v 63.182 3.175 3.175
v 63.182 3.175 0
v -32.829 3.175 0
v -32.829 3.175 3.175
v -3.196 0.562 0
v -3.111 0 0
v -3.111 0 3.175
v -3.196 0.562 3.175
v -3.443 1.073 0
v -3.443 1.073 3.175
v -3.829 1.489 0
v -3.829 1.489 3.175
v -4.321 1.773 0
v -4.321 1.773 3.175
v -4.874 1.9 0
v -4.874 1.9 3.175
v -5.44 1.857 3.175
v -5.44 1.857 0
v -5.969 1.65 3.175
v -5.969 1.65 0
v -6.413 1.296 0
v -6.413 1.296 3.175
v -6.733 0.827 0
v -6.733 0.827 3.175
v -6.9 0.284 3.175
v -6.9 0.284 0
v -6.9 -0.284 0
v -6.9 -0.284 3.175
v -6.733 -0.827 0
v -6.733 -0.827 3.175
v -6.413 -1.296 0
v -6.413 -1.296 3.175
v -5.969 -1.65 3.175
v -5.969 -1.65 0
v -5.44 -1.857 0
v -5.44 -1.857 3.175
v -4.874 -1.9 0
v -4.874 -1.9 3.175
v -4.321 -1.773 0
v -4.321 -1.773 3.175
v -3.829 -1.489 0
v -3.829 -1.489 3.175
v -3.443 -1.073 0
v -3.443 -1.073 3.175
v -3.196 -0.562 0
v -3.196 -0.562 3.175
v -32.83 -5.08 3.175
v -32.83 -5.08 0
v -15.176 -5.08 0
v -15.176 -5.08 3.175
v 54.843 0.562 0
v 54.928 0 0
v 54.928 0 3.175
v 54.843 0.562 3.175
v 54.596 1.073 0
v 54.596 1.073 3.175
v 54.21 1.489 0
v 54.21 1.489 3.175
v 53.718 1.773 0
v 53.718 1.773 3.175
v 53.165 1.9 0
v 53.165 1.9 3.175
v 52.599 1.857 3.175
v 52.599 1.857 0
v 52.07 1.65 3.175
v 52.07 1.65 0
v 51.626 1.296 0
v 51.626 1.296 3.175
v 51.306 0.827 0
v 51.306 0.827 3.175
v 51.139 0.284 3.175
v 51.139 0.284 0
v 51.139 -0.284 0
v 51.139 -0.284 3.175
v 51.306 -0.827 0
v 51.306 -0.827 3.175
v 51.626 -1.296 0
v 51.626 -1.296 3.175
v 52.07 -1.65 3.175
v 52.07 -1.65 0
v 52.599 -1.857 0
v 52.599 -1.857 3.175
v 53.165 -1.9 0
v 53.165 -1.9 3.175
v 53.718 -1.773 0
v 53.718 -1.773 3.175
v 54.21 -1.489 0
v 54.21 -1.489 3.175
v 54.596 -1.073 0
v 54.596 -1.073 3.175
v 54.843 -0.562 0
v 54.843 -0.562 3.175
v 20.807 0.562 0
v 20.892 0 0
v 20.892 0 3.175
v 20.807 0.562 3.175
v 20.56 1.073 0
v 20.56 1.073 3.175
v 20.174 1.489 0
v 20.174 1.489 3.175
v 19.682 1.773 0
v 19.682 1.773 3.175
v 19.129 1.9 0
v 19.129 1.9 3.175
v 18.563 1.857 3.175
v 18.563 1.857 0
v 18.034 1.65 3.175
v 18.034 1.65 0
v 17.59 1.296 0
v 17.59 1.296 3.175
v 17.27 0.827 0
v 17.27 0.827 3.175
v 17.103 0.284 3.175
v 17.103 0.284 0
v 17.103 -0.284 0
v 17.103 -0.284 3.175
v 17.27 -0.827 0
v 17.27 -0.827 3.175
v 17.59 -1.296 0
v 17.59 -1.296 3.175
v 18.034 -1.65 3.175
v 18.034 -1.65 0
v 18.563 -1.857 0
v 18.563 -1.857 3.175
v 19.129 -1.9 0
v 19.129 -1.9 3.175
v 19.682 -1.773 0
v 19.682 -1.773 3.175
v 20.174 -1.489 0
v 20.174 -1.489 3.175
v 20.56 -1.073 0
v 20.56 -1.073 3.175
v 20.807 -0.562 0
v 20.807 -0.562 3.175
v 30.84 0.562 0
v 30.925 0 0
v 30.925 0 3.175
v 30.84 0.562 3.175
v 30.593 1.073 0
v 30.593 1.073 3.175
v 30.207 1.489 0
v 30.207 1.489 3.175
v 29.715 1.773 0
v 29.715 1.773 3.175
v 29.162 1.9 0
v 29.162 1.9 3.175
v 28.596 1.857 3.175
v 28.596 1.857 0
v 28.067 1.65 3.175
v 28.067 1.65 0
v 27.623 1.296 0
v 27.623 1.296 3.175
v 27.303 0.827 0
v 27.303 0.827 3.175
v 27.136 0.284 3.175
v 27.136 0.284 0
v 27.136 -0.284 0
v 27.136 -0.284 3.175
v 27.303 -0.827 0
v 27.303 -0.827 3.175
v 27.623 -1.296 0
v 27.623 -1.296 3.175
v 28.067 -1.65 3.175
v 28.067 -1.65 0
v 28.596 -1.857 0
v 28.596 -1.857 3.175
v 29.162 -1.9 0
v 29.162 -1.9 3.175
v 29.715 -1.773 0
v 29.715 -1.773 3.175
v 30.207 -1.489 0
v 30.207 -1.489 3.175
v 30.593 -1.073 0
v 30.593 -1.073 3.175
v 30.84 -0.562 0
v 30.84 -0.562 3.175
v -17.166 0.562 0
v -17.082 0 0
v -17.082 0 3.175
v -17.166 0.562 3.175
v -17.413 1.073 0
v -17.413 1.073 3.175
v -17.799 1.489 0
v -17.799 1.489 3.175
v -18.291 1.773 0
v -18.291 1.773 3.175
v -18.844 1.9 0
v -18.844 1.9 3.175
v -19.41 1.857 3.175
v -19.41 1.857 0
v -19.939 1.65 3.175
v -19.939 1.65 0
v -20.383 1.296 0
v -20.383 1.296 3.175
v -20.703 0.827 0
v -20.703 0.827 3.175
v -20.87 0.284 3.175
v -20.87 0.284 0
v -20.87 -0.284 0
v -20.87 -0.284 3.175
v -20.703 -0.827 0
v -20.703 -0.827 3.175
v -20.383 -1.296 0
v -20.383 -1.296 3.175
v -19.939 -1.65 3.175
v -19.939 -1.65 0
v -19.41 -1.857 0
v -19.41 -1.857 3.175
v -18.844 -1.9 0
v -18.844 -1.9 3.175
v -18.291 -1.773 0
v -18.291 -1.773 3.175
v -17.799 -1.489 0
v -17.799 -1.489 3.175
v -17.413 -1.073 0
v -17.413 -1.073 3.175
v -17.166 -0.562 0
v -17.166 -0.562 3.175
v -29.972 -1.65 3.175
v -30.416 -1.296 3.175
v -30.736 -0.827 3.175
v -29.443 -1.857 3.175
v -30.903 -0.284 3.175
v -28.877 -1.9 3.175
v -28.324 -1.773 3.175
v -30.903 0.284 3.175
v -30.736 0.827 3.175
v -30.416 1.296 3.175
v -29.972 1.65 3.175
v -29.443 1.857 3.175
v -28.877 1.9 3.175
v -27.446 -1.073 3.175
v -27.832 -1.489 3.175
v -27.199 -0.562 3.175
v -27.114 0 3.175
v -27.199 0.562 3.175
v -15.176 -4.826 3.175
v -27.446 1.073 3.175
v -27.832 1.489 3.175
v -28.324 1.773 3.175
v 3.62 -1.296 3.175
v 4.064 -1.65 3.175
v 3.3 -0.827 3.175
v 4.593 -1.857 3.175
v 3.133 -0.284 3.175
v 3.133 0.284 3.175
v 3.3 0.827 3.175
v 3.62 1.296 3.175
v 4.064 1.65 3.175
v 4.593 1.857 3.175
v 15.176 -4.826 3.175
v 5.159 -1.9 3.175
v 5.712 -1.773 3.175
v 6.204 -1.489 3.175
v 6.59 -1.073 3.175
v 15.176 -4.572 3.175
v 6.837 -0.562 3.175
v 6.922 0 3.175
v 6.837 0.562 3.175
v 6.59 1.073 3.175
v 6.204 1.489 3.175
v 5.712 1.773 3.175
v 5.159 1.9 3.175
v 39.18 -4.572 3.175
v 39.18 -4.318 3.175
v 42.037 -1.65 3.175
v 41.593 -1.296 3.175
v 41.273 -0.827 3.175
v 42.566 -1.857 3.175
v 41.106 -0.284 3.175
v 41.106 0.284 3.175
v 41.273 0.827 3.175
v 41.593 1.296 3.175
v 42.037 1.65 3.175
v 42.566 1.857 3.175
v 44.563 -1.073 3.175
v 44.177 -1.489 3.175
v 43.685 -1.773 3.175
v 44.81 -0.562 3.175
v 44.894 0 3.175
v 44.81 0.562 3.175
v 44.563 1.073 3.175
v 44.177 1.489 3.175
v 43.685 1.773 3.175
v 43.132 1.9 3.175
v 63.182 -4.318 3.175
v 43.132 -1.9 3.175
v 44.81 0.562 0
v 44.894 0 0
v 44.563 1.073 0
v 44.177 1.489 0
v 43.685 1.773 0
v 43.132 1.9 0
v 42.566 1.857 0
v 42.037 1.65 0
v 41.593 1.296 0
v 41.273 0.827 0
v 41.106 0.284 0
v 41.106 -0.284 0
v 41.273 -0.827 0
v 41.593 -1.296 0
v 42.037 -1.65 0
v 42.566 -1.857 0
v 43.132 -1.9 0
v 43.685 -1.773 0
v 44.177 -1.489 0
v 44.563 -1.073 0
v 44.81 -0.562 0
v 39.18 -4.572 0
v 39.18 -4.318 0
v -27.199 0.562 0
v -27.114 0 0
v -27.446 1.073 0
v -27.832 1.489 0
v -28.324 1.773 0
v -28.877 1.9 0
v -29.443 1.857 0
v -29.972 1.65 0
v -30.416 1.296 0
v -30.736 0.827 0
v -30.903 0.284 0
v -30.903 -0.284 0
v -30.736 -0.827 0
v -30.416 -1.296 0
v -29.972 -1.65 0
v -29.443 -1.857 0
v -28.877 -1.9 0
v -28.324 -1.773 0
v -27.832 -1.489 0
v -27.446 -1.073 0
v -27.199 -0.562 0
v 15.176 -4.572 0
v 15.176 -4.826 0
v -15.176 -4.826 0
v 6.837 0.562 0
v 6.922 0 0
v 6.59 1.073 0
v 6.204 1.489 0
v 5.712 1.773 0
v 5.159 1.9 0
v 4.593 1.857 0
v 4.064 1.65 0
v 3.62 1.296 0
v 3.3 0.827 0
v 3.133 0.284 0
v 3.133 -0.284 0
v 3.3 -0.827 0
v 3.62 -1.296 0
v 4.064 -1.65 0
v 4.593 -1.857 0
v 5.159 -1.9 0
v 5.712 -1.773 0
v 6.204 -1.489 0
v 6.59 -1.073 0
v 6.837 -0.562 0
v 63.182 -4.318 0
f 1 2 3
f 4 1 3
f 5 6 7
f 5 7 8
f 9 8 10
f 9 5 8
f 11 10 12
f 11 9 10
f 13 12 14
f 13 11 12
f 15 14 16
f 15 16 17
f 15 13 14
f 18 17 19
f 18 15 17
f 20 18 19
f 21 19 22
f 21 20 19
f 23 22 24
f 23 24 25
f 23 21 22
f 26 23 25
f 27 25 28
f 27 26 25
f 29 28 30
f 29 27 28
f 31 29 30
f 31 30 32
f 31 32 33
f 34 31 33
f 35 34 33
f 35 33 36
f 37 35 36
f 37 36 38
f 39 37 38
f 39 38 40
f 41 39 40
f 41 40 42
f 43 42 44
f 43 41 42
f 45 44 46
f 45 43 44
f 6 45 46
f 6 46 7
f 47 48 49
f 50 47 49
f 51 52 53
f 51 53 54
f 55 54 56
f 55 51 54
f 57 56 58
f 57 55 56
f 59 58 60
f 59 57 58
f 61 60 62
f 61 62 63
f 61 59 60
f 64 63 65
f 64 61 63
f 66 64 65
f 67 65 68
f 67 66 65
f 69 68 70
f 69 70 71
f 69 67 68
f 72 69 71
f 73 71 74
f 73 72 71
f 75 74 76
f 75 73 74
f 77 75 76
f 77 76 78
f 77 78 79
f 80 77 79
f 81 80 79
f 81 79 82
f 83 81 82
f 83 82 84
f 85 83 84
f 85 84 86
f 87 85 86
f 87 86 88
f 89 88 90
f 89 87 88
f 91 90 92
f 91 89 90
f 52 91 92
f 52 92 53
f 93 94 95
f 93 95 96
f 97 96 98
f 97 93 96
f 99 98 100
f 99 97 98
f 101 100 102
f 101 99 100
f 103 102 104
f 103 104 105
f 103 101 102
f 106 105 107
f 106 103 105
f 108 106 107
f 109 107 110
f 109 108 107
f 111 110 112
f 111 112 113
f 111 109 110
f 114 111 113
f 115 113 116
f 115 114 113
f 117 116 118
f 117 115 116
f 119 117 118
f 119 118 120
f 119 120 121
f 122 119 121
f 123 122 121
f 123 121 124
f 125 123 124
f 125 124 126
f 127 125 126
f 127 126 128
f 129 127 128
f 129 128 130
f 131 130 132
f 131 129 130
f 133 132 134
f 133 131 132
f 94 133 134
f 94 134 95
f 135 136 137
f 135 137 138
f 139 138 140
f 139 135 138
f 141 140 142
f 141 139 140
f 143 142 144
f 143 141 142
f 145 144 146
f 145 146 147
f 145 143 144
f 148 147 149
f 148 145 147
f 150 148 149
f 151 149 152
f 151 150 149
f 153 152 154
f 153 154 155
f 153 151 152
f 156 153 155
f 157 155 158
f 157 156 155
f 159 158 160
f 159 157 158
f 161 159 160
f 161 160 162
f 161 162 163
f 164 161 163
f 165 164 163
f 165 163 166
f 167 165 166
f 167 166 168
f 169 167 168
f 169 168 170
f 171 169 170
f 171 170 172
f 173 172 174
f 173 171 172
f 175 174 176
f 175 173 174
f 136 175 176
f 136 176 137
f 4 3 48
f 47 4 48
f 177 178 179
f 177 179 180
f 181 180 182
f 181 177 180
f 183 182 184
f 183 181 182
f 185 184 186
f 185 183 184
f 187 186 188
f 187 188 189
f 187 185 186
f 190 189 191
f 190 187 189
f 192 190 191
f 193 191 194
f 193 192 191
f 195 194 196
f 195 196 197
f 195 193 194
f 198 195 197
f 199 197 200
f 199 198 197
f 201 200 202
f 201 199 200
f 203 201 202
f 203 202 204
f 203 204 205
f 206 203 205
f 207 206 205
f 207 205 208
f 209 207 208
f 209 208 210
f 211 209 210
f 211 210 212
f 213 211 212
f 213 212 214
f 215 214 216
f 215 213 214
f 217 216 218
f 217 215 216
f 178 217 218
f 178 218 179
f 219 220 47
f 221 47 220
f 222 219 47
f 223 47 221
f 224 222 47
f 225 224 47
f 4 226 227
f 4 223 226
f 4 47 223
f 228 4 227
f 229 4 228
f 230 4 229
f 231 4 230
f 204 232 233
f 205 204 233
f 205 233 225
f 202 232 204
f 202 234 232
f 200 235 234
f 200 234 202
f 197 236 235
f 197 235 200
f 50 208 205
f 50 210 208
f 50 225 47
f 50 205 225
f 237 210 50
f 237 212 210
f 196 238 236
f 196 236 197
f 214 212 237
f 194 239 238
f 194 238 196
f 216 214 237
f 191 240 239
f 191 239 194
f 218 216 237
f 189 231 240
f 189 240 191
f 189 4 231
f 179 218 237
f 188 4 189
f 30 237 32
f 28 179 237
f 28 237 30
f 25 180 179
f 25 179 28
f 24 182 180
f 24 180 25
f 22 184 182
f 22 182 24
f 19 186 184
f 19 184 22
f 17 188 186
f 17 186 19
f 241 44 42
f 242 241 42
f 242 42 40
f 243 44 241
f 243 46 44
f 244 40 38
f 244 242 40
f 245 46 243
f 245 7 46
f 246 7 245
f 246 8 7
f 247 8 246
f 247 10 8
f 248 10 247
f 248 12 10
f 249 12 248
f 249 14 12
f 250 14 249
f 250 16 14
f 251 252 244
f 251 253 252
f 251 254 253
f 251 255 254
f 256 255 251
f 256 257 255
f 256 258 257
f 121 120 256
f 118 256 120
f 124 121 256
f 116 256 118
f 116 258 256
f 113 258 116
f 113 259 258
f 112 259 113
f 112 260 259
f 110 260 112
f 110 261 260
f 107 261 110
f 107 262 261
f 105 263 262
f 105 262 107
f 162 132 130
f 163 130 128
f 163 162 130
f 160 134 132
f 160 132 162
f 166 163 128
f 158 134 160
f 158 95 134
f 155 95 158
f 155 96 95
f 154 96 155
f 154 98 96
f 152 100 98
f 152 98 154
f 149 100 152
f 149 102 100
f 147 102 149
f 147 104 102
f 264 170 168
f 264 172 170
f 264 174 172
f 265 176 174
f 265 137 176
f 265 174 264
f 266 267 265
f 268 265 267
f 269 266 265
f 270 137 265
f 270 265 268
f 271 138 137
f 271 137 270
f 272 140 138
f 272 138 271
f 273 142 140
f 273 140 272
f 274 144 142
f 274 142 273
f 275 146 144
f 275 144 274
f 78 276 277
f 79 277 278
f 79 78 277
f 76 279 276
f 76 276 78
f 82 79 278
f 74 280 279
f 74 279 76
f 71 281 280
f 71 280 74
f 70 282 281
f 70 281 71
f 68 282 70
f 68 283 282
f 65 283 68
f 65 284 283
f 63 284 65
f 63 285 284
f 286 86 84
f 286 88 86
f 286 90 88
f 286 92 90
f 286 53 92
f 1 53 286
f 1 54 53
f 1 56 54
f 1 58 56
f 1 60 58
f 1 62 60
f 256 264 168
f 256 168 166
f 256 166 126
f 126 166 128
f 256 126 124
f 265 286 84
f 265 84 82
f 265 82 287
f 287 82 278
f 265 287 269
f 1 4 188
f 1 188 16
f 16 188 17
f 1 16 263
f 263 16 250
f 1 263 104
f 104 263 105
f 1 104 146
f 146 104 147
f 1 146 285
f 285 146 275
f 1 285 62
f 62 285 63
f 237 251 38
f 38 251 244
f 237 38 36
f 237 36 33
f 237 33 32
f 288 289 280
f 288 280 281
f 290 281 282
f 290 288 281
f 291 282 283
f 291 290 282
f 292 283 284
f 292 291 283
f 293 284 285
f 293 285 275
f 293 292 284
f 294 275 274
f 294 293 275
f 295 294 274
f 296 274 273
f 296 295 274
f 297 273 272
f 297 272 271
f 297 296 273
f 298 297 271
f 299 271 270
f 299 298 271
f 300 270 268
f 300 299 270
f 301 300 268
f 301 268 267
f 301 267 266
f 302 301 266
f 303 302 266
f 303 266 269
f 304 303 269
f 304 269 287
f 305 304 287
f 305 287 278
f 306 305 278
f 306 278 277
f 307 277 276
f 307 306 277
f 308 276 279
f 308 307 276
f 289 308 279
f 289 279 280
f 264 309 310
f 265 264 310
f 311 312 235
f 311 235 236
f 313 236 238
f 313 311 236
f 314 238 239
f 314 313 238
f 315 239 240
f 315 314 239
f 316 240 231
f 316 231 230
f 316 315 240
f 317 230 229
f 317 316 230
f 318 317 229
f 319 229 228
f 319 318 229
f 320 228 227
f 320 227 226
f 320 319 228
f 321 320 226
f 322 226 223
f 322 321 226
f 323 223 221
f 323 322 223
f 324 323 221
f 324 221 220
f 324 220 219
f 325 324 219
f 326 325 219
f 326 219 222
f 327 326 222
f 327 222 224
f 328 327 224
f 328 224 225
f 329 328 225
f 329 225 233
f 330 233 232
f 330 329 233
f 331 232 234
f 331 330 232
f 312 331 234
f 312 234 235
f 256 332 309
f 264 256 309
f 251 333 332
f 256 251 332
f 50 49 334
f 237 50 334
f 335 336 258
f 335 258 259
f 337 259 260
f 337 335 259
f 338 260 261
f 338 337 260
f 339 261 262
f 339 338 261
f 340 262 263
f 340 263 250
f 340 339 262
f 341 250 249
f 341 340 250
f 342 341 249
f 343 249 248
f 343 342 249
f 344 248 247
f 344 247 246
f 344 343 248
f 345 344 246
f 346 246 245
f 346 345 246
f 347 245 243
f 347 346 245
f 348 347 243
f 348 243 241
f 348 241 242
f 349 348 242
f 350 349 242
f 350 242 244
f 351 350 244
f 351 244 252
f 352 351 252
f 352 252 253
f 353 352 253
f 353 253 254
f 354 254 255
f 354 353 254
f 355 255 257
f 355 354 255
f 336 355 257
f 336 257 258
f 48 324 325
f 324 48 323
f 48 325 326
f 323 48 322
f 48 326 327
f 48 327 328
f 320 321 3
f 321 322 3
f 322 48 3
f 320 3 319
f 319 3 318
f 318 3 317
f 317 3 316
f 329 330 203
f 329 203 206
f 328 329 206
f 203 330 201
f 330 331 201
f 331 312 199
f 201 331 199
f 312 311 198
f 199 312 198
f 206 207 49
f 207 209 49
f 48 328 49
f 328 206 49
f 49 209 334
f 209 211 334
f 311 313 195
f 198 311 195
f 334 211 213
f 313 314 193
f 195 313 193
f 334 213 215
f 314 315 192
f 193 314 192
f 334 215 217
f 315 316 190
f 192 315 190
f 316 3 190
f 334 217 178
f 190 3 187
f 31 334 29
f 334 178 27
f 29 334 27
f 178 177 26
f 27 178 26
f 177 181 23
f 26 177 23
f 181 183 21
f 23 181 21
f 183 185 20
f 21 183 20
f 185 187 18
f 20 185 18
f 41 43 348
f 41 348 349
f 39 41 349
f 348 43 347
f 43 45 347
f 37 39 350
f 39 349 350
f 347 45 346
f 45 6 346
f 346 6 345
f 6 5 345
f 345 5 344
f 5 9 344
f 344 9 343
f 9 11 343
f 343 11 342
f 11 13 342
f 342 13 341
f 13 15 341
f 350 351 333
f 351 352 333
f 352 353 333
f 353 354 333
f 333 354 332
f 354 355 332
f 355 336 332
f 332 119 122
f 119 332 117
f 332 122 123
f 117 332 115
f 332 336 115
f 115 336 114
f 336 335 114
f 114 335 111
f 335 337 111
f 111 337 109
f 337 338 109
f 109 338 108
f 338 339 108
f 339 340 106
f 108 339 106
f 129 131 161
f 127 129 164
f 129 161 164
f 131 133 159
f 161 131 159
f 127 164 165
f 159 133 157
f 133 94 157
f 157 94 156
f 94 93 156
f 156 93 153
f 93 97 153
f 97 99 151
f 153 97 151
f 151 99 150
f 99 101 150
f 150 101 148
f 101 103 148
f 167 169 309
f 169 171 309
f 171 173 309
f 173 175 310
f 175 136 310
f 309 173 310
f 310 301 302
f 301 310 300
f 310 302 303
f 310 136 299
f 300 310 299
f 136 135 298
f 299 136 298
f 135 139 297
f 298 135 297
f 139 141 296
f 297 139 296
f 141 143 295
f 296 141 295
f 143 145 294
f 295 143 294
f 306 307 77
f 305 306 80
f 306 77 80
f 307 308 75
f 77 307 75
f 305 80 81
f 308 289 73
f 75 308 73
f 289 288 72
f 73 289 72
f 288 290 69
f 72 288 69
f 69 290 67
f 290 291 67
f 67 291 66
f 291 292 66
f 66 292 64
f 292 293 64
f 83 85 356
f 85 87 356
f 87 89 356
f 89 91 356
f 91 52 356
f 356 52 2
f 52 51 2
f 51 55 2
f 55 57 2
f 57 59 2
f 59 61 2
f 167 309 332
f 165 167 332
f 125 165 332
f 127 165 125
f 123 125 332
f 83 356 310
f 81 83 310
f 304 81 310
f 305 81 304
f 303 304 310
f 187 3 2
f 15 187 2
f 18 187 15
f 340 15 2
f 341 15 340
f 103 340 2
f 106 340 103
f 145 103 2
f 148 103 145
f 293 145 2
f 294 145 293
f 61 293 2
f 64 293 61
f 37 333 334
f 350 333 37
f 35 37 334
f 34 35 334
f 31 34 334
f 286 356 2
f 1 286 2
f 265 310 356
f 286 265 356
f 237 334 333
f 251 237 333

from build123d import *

# Parameters (mm, degrees)
F0_W     = 17.653
F0_H     = 1.651
F0_H_2   = 6.35
F0_R     = 1.905
F0_H_3   = 1.397
F0_H_4   = 1.143
F1_DEPTH = 3.175


with BuildPart() as f1:
    # F0 (on Top) → F1 (new body)
    with BuildSketch(Plane.XY):
        with Locations((0, -4.0005)):
            Rectangle(F0_W, F0_H)
        Rectangle(F0_W, F0_H_2)
        with Locations((-5.0165, 0)):
            Circle(F0_R, mode=Mode.SUBTRACT)
        with Locations((5.0165, 0)):
            Circle(F0_R, mode=Mode.SUBTRACT)
        Polygon((8.8265, 3.175), (8.8265, -3.175), (8.8265, -4.826), (12.0015, -4.826), (12.0015, 3.175), align=None)
        Polygon((-8.8265, -4.826), (-8.8265, -3.175), (-8.8265, 3.175), (-12.0015, 3.175), (-12.0015, -4.826), align=None)
        Polygon((15.1765, 3.175), (12.0015, 3.175), (12.0015, -4.826), (15.1765, -4.826), (15.1765, -4.572), (15.1765, -3.175), align=None)
        Polygon((-12.0015, -4.826), (-12.0015, 3.175), (-15.1765, 3.175), (-15.1765, -3.175), (-15.1765, -4.826), align=None)
        with Locations((24.003, 0)):
            Rectangle(F0_W, F0_H_2)
        with Locations((18.9865, 0)):
            Circle(F0_R, mode=Mode.SUBTRACT)
        with Locations((29.0195, 0)):
            Circle(F0_R, mode=Mode.SUBTRACT)
        with Locations((-24.003, 0)):
            Rectangle(F0_W, F0_H_2)
        with Locations((-29.0195, 0)):
            Circle(F0_R, mode=Mode.SUBTRACT)
        with Locations((-18.9865, 0)):
            Circle(F0_R, mode=Mode.SUBTRACT)
        Polygon((-15.1765, -5.08), (-15.1765, -4.826), (-15.1765, -3.175), (-32.8295, -3.175), (-32.8295, -5.08), align=None)
        with Locations((24.003, -3.8735)):
            Rectangle(F0_W, F0_H_3)
        Polygon((36.0045, 3.175), (32.8295, 3.175), (32.8295, -3.175), (32.8295, -4.572), (36.0045, -4.572), align=None)
        Polygon((39.1795, 3.175), (36.0045, 3.175), (36.0045, -4.572), (39.1795, -4.572), (39.1795, -4.318), (39.1795, -3.175), align=None)
        with Locations((48.006, 0)):
            Rectangle(F0_W, F0_H_2)
        with Locations((42.9895, 0)):
            Circle(F0_R, mode=Mode.SUBTRACT)
        with Locations((53.0225, 0)):
            Circle(F0_R, mode=Mode.SUBTRACT)
        with Locations((48.006, -3.7465)):
            Rectangle(F0_W, F0_H_4)
        Polygon((63.1825, 3.175), (56.8325, 3.175), (56.8325, -3.175), (56.8325, -4.318), (63.1825, -4.318), align=None)
    extrude(amount=F1_DEPTH)


solid = f1.part
